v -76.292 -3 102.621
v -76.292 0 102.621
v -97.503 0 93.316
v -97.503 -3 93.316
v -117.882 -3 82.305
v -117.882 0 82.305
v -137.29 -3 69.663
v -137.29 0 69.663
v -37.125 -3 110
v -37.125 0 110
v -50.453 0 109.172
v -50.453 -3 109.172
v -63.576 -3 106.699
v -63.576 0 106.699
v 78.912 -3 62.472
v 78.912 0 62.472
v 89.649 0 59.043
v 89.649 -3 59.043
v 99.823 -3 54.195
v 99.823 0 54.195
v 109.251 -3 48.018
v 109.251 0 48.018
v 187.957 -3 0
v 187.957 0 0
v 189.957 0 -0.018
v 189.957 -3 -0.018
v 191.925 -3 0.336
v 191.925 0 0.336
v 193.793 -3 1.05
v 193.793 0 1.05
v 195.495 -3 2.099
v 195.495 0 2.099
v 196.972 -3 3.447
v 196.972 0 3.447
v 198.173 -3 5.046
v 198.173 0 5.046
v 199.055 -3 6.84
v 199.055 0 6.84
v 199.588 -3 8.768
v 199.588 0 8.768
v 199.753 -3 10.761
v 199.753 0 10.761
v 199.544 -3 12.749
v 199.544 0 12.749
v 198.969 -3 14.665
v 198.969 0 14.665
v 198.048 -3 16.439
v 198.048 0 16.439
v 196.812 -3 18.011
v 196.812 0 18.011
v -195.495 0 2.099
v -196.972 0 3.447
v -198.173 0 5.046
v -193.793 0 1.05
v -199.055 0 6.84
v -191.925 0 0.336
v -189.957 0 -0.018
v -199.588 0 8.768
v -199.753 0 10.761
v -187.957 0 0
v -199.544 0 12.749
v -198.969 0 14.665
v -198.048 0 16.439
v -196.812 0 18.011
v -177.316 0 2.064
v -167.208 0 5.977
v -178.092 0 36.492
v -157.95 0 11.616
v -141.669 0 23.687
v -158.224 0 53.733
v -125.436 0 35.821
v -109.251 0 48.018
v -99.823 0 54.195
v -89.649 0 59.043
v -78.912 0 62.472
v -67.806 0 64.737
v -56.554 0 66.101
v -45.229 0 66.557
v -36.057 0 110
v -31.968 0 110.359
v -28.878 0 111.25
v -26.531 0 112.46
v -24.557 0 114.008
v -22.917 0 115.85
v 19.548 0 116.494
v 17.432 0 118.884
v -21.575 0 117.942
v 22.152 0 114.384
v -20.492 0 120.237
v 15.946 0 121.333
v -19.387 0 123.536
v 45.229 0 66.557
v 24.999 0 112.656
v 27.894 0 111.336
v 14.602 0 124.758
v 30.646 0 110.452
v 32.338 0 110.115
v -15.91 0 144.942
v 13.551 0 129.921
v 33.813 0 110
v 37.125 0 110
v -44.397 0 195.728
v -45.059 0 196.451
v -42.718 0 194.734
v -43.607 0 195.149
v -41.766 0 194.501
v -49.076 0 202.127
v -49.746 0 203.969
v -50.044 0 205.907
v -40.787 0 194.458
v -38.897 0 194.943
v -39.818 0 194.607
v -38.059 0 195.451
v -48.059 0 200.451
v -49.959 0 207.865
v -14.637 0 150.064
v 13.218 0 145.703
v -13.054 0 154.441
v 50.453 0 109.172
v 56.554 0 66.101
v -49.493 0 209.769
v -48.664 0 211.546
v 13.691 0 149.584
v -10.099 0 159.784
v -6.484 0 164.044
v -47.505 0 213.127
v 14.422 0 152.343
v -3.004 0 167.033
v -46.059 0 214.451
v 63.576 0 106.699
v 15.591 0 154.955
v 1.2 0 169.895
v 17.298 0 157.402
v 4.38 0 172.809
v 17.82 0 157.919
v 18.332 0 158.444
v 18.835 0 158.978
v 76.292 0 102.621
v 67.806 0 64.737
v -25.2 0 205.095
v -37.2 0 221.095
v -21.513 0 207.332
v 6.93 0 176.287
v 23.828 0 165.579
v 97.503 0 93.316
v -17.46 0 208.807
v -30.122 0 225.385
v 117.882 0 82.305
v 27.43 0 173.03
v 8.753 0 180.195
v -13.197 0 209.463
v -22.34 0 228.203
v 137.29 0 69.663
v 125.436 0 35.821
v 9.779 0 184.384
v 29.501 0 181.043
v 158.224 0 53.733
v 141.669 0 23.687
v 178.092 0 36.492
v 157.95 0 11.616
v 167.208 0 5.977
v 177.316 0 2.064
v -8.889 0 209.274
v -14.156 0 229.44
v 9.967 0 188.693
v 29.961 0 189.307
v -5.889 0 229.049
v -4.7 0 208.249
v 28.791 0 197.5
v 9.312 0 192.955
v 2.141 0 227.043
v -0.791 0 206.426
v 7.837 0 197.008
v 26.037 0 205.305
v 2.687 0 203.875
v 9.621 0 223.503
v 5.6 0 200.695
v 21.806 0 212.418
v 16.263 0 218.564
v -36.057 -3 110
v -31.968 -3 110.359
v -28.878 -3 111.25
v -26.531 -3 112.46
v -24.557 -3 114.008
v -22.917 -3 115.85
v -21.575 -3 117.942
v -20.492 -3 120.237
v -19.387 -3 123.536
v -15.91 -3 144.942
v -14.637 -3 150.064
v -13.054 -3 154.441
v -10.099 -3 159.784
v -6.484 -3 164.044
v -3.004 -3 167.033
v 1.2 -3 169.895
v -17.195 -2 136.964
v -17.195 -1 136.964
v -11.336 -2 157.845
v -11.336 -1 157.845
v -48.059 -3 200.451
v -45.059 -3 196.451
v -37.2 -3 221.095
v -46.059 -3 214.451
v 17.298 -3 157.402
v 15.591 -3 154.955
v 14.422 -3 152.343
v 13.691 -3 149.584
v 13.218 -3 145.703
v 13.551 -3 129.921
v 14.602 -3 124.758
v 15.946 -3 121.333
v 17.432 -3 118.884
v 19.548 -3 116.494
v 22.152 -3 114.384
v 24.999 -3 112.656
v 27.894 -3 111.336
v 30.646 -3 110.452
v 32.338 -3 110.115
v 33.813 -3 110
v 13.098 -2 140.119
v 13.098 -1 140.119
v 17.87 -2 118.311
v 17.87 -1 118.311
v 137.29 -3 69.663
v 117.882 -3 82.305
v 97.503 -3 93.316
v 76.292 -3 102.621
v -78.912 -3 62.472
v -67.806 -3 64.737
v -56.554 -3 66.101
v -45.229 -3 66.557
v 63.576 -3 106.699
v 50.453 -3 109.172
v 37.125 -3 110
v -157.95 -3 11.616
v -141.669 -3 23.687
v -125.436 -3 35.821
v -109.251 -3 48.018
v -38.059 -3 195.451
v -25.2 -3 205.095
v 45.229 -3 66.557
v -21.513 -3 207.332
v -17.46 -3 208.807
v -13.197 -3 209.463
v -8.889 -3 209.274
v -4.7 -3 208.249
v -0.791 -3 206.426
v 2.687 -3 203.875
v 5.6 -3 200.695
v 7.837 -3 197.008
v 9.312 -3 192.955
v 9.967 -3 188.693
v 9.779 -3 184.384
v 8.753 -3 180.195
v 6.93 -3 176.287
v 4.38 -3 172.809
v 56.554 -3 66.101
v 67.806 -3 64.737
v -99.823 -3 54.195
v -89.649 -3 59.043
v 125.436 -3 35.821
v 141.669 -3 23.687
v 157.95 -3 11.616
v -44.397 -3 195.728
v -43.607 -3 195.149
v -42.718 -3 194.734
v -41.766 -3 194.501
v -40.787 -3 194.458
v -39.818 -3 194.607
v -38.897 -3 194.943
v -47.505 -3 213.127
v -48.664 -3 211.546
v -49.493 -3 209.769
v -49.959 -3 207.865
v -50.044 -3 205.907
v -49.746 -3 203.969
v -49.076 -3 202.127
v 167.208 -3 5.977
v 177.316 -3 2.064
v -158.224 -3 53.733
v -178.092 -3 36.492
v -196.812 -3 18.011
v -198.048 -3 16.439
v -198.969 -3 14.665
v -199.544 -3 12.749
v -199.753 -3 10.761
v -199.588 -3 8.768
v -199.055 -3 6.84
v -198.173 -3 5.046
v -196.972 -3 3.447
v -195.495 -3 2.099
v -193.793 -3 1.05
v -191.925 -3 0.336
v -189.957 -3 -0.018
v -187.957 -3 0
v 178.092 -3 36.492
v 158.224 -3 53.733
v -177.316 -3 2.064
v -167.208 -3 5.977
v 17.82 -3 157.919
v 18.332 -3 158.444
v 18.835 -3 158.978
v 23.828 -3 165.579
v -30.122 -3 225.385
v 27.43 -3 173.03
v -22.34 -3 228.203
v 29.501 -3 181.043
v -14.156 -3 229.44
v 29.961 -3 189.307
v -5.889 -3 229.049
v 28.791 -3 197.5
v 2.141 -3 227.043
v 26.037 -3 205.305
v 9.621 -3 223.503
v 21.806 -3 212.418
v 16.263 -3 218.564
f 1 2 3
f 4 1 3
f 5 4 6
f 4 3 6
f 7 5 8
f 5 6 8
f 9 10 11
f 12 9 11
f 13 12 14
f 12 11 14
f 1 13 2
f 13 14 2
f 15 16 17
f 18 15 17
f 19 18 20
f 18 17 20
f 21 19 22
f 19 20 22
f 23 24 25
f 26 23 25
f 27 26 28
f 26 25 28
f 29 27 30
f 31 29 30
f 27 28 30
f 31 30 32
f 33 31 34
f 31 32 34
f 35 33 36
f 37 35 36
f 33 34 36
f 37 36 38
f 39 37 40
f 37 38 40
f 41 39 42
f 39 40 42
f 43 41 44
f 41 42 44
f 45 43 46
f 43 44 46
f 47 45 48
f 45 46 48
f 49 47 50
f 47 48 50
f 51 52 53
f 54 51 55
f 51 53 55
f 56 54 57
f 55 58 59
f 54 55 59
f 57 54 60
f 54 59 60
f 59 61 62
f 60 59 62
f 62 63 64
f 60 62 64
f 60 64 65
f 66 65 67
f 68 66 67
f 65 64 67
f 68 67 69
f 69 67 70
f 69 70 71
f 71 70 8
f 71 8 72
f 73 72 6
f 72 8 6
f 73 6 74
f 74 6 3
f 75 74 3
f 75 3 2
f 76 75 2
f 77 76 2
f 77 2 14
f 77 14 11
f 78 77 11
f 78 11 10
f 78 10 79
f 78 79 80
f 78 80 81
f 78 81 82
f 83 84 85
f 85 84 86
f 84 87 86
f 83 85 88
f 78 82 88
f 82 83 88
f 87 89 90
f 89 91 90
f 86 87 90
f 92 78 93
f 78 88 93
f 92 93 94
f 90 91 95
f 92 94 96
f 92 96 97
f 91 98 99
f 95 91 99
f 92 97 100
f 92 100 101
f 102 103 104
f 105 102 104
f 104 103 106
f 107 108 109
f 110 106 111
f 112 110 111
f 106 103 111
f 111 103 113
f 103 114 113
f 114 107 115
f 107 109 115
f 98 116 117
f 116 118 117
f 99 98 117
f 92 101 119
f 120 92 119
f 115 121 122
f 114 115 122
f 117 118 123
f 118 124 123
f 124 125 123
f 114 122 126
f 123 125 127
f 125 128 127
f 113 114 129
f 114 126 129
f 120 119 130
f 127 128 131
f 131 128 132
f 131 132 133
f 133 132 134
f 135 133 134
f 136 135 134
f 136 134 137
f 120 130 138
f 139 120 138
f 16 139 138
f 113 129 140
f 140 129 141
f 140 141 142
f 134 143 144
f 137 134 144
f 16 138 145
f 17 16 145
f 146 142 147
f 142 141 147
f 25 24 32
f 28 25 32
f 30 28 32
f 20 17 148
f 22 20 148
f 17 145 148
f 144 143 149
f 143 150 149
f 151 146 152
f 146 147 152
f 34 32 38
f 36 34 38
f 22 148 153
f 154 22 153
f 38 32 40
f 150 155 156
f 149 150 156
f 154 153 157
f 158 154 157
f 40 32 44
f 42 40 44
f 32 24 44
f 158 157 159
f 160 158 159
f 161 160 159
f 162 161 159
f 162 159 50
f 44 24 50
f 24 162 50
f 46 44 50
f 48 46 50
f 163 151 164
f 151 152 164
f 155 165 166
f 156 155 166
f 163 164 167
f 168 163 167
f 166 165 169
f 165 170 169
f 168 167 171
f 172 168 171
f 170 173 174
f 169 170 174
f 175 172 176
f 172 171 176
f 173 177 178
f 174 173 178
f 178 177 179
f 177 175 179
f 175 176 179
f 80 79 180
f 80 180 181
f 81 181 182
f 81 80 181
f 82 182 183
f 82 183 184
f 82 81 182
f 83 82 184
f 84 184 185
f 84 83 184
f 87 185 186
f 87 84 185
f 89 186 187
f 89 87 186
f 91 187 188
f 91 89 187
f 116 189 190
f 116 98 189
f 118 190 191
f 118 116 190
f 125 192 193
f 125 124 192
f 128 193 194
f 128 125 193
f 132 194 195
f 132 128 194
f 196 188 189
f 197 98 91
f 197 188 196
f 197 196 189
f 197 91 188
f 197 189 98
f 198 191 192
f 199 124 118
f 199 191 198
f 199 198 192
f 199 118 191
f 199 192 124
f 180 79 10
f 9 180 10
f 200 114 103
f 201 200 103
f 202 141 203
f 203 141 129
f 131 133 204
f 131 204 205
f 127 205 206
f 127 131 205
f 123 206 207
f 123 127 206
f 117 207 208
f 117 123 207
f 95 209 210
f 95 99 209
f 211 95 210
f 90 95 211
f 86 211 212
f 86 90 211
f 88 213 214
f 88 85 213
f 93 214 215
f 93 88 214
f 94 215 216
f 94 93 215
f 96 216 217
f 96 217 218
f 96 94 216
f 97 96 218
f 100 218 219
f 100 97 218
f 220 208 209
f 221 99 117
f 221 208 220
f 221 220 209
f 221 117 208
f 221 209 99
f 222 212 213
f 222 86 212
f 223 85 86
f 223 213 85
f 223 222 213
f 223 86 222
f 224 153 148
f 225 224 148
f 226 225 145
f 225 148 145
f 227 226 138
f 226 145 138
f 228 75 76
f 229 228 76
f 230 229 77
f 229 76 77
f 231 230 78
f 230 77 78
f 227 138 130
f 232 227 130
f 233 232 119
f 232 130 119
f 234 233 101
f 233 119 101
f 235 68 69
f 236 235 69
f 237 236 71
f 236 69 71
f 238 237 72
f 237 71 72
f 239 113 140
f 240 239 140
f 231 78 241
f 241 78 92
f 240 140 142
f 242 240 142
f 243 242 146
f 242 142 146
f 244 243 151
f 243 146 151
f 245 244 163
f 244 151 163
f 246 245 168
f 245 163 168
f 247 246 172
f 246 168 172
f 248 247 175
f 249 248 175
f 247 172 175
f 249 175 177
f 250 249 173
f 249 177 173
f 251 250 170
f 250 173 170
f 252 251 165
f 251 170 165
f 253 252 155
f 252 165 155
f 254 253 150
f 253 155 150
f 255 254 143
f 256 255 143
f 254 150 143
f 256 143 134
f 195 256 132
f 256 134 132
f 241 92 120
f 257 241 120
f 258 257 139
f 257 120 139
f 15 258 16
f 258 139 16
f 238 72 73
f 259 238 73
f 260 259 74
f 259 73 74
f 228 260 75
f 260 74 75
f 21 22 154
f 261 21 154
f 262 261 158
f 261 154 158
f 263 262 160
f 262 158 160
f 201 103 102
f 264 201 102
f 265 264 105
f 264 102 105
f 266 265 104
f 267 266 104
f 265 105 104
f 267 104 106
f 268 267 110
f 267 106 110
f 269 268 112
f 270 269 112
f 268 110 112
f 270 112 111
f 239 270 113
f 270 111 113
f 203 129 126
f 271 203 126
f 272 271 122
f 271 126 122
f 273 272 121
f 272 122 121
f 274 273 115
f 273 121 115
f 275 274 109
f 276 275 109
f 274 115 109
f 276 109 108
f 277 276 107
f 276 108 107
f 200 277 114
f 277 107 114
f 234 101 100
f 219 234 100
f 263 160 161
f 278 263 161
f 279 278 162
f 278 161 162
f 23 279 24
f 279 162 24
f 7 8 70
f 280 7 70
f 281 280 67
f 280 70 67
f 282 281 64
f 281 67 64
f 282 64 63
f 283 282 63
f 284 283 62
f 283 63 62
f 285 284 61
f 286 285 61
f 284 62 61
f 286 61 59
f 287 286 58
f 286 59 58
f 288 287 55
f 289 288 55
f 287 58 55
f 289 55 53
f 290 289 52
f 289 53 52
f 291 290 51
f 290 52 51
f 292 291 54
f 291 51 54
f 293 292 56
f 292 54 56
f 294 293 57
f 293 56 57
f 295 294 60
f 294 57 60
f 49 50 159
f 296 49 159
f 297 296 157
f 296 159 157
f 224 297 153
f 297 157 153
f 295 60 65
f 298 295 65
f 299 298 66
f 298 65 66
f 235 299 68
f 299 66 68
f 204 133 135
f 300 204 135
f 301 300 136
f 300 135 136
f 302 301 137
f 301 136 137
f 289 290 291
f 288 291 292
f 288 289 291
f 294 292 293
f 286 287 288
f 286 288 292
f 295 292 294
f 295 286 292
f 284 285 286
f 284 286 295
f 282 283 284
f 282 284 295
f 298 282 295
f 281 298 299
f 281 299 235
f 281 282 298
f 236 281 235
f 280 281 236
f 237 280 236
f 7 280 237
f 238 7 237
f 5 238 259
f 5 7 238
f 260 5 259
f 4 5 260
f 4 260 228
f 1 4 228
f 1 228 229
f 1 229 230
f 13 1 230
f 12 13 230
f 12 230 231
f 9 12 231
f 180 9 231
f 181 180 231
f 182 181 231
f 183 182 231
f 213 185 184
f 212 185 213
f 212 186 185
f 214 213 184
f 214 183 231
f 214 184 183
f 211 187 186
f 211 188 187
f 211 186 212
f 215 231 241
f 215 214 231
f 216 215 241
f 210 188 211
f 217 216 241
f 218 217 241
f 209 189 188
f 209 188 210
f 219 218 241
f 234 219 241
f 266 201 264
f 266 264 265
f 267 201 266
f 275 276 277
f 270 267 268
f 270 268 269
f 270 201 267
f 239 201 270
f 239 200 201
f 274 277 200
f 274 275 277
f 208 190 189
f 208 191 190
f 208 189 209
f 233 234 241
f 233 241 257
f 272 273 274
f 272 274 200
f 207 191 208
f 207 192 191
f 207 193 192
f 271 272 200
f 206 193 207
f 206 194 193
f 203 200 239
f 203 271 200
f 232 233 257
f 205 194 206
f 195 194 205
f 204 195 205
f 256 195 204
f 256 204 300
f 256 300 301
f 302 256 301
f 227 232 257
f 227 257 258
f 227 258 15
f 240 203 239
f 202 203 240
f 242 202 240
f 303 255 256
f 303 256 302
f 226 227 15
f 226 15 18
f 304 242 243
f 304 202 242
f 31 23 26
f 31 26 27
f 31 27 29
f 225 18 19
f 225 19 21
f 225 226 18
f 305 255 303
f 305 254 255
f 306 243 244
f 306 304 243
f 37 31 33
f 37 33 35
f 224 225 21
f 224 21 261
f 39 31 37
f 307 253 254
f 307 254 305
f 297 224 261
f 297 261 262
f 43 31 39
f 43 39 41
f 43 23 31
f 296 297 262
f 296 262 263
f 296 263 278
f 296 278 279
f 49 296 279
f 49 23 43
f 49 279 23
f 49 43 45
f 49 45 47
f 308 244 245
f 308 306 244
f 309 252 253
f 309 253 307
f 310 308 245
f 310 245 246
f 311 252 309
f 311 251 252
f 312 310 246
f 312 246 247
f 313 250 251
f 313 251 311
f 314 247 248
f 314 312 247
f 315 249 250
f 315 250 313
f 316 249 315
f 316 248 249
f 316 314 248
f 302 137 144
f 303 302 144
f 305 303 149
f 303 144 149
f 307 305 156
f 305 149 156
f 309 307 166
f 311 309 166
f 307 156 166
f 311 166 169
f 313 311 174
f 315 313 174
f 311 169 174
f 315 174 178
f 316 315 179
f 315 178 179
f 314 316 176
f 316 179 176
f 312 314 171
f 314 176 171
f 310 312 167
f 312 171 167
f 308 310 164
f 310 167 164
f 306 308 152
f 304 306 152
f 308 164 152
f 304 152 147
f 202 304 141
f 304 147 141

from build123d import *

# Parameters (mm, degrees)
F2_DEPTH = 3
F3_DEPTH = 3


with BuildPart() as f2:
    # F0 (on Front) → F2 (new body)
    with BuildSketch(Plane.XZ):
        with BuildLine():
            Line((0, 110), (-37.1250543006, 110))
            ThreePointArc((-37.1250543006, 110), (-57.0530283082, 108.1392327186), (-76.2920156121, 102.6212647557))
            ThreePointArc((-76.2920156121, 102.6212647557), (-107.8053845023, 88.0195194413), (-137.2898370028, 69.6627646685))
            ThreePointArc((-137.2898370028, 69.6627646685), (-168.2962814604, 45.2722513622), (-196.811914444, 18.0113743991))
            ThreePointArc((-196.811914444, 18.0113743991), (-198.6562382919, 5.922529929), (-187.9573911428, 0))
            ThreePointArc((-187.9573911428, 0), (-172.1749520727, 3.7961120216), (-157.950386405, 11.6164432839))
            ThreePointArc((-157.950386405, 11.6164432839), (-133.5467802063, 29.7456036712), (-109.2505156994, 48.0183698237))
            ThreePointArc((-109.2505156994, 48.0183698237), (-94.8181161846, 56.7914277787), (-78.9122924344, 62.4716982356))
            ThreePointArc((-78.9122924344, 62.4716982356), (-62.1941450585, 65.5321609692), (-45.2291222508, 66.5572877705))
            Line((-45.2291222508, 66.5572877705), (0, 66.5572877705))
            Line((0, 66.5572877705), (45.2291222508, 66.5572877705))
            ThreePointArc((45.2291222508, 66.5572877705), (62.1941450585, 65.5321609692), (78.9122924344, 62.4716982356))
            ThreePointArc((78.9122924344, 62.4716982356), (94.8181161846, 56.7914277787), (109.2505156994, 48.0183698237))
            ThreePointArc((109.2505156994, 48.0183698237), (133.5467802063, 29.7456036712), (157.950386405, 11.6164432839))
            ThreePointArc((157.950386405, 11.6164432839), (172.1749520727, 3.7961120216), (187.9573911428, 0))
            ThreePointArc((187.9573911428, 0), (198.6562382919, 5.922529929), (196.811914444, 18.0113743991))
            ThreePointArc((196.811914444, 18.0113743991), (168.2962814604, 45.2722513622), (137.2898370028, 69.6627646685))
            ThreePointArc((137.2898370028, 69.6627646685), (107.8053845023, 88.0195194413), (76.2920156121, 102.6212647557))
            ThreePointArc((76.2920156121, 102.6212647557), (57.0530283082, 108.1392327186), (37.1250543006, 110))
            Line((37.1250543006, 110), (0, 110))
        make_face()
    extrude(amount=F2_DEPTH)

    # F1 (on Front) → F3 (join)
    with BuildSketch(Plane.XZ):
        with BuildLine():
            ThreePointArc((18.8345826463, 158.9782924416), (19.1860958712, 215.6277740938), (-37.2, 221.0954541697))
            Line((-37.2, 221.0954541697), (-46.0592777571, 214.4509958519))
            ThreePointArc((-46.0592777571, 214.4509958519), (-49.9587726937, 207.8652094143), (-48.0592777571, 200.4509958519))
            Line((-48.0592777571, 200.4509958519), (-45.0592777571, 196.4509958519))
            ThreePointArc((-45.0592777571, 196.4509958519), (-41.7663845383, 194.5012483836), (-38.0592777571, 195.4509958519))
            Line((-38.0592777571, 195.4509958519), (-25.2, 205.0954541697))
            ThreePointArc((-25.2, 205.0954541697), (5.6, 200.6954541697), (1.2, 169.8954541697))
            ThreePointArc((1.2, 169.8954541697), (-5.571825393, 161.7813668662), (-8, 151.4954541697))
            Line((-8, 151.4954541697), (-8, 110))
            Line((-8, 110), (0, 110))
            Line((0, 110), (12, 110))
            Line((12, 110), (12, 151.4954541697))
            ThreePointArc((12, 151.4954541697), (12.316718427, 152.8370949562), (13.2, 153.8954541697))
            ThreePointArc((13.2, 153.8954541697), (15.3055154559, 155.5829358472), (17.2983292582, 157.4021342685))
            add(Edge.make_bspline(
                [(18.8345826463, 158.9782924416), (18.2685657224, 158.4677005018), (17.7583091445, 157.9420185701), (17.2983292582, 157.4021342685)],
                knots=[0, 0, 0, 0, 0.0332714109, 0.0332714109, 0.0332714109, 0.0332714109], degree=3))
        make_face()
        with BuildLine():
            ThreePointArc((17.2983292582, 157.4021342685), (18.0767824439, 158.180148307), (18.8345826463, 158.9782924416))
            add(Edge.make_bspline(
                [(18.8345826463, 158.9782924416), (18.2685657224, 158.4677005018), (17.7583091445, 157.9420185701), (17.2983292582, 157.4021342685)],
                knots=[0, 0, 0, 0, 0.0332714109, 0.0332714109, 0.0332714109, 0.0332714109], degree=3))
        make_face()
        with BuildLine():
            add(Edge.make_bspline(
                [(17.2983292582, 157.4021342685), (13.1793035086, 152.5675808311), (12.9884623094, 139.527426253), (13.3703276725, 116.5931182655), (29.7821242027, 110), (33.8129806474, 110)],
                knots=[0.0332714109, 0.0332714109, 0.0332714109, 0.0332714109, 0.3312100872, 0.6836806519, 1, 1, 1, 1], degree=3))
            ThreePointArc((17.2983292582, 157.4021342685), (15.3055154559, 155.5829358472), (13.2, 153.8954541697))
            ThreePointArc((13.2, 153.8954541697), (12.316718427, 152.8370949562), (12, 151.4954541697))
            Line((12, 151.4954541697), (12, 110))
            Line((12, 110), (33.8129806474, 110))
        make_face()
        with BuildLine():
            ThreePointArc((-8, 151.4954541697), (-5.571825393, 161.7813668662), (1.2, 169.8954541697))
            add(Edge.make_bspline(
                [(-36.0568419915, 110), (-19.4195834096, 110), (-18.0177646467, 138.2709232819), (-12.939977235, 158.3678372994), (-4.7115848759, 166.2572265506), (1.2, 169.8954541697)],
                knots=[0, 0, 0, 0, 0.3938915377, 0.7136667849, 1, 1, 1, 1], degree=3))
            Line((-36.0568419915, 110), (-8, 110))
            Line((-8, 110), (-8, 151.4954541697))
        make_face()
    extrude(amount=F3_DEPTH)


solid = f2.part
